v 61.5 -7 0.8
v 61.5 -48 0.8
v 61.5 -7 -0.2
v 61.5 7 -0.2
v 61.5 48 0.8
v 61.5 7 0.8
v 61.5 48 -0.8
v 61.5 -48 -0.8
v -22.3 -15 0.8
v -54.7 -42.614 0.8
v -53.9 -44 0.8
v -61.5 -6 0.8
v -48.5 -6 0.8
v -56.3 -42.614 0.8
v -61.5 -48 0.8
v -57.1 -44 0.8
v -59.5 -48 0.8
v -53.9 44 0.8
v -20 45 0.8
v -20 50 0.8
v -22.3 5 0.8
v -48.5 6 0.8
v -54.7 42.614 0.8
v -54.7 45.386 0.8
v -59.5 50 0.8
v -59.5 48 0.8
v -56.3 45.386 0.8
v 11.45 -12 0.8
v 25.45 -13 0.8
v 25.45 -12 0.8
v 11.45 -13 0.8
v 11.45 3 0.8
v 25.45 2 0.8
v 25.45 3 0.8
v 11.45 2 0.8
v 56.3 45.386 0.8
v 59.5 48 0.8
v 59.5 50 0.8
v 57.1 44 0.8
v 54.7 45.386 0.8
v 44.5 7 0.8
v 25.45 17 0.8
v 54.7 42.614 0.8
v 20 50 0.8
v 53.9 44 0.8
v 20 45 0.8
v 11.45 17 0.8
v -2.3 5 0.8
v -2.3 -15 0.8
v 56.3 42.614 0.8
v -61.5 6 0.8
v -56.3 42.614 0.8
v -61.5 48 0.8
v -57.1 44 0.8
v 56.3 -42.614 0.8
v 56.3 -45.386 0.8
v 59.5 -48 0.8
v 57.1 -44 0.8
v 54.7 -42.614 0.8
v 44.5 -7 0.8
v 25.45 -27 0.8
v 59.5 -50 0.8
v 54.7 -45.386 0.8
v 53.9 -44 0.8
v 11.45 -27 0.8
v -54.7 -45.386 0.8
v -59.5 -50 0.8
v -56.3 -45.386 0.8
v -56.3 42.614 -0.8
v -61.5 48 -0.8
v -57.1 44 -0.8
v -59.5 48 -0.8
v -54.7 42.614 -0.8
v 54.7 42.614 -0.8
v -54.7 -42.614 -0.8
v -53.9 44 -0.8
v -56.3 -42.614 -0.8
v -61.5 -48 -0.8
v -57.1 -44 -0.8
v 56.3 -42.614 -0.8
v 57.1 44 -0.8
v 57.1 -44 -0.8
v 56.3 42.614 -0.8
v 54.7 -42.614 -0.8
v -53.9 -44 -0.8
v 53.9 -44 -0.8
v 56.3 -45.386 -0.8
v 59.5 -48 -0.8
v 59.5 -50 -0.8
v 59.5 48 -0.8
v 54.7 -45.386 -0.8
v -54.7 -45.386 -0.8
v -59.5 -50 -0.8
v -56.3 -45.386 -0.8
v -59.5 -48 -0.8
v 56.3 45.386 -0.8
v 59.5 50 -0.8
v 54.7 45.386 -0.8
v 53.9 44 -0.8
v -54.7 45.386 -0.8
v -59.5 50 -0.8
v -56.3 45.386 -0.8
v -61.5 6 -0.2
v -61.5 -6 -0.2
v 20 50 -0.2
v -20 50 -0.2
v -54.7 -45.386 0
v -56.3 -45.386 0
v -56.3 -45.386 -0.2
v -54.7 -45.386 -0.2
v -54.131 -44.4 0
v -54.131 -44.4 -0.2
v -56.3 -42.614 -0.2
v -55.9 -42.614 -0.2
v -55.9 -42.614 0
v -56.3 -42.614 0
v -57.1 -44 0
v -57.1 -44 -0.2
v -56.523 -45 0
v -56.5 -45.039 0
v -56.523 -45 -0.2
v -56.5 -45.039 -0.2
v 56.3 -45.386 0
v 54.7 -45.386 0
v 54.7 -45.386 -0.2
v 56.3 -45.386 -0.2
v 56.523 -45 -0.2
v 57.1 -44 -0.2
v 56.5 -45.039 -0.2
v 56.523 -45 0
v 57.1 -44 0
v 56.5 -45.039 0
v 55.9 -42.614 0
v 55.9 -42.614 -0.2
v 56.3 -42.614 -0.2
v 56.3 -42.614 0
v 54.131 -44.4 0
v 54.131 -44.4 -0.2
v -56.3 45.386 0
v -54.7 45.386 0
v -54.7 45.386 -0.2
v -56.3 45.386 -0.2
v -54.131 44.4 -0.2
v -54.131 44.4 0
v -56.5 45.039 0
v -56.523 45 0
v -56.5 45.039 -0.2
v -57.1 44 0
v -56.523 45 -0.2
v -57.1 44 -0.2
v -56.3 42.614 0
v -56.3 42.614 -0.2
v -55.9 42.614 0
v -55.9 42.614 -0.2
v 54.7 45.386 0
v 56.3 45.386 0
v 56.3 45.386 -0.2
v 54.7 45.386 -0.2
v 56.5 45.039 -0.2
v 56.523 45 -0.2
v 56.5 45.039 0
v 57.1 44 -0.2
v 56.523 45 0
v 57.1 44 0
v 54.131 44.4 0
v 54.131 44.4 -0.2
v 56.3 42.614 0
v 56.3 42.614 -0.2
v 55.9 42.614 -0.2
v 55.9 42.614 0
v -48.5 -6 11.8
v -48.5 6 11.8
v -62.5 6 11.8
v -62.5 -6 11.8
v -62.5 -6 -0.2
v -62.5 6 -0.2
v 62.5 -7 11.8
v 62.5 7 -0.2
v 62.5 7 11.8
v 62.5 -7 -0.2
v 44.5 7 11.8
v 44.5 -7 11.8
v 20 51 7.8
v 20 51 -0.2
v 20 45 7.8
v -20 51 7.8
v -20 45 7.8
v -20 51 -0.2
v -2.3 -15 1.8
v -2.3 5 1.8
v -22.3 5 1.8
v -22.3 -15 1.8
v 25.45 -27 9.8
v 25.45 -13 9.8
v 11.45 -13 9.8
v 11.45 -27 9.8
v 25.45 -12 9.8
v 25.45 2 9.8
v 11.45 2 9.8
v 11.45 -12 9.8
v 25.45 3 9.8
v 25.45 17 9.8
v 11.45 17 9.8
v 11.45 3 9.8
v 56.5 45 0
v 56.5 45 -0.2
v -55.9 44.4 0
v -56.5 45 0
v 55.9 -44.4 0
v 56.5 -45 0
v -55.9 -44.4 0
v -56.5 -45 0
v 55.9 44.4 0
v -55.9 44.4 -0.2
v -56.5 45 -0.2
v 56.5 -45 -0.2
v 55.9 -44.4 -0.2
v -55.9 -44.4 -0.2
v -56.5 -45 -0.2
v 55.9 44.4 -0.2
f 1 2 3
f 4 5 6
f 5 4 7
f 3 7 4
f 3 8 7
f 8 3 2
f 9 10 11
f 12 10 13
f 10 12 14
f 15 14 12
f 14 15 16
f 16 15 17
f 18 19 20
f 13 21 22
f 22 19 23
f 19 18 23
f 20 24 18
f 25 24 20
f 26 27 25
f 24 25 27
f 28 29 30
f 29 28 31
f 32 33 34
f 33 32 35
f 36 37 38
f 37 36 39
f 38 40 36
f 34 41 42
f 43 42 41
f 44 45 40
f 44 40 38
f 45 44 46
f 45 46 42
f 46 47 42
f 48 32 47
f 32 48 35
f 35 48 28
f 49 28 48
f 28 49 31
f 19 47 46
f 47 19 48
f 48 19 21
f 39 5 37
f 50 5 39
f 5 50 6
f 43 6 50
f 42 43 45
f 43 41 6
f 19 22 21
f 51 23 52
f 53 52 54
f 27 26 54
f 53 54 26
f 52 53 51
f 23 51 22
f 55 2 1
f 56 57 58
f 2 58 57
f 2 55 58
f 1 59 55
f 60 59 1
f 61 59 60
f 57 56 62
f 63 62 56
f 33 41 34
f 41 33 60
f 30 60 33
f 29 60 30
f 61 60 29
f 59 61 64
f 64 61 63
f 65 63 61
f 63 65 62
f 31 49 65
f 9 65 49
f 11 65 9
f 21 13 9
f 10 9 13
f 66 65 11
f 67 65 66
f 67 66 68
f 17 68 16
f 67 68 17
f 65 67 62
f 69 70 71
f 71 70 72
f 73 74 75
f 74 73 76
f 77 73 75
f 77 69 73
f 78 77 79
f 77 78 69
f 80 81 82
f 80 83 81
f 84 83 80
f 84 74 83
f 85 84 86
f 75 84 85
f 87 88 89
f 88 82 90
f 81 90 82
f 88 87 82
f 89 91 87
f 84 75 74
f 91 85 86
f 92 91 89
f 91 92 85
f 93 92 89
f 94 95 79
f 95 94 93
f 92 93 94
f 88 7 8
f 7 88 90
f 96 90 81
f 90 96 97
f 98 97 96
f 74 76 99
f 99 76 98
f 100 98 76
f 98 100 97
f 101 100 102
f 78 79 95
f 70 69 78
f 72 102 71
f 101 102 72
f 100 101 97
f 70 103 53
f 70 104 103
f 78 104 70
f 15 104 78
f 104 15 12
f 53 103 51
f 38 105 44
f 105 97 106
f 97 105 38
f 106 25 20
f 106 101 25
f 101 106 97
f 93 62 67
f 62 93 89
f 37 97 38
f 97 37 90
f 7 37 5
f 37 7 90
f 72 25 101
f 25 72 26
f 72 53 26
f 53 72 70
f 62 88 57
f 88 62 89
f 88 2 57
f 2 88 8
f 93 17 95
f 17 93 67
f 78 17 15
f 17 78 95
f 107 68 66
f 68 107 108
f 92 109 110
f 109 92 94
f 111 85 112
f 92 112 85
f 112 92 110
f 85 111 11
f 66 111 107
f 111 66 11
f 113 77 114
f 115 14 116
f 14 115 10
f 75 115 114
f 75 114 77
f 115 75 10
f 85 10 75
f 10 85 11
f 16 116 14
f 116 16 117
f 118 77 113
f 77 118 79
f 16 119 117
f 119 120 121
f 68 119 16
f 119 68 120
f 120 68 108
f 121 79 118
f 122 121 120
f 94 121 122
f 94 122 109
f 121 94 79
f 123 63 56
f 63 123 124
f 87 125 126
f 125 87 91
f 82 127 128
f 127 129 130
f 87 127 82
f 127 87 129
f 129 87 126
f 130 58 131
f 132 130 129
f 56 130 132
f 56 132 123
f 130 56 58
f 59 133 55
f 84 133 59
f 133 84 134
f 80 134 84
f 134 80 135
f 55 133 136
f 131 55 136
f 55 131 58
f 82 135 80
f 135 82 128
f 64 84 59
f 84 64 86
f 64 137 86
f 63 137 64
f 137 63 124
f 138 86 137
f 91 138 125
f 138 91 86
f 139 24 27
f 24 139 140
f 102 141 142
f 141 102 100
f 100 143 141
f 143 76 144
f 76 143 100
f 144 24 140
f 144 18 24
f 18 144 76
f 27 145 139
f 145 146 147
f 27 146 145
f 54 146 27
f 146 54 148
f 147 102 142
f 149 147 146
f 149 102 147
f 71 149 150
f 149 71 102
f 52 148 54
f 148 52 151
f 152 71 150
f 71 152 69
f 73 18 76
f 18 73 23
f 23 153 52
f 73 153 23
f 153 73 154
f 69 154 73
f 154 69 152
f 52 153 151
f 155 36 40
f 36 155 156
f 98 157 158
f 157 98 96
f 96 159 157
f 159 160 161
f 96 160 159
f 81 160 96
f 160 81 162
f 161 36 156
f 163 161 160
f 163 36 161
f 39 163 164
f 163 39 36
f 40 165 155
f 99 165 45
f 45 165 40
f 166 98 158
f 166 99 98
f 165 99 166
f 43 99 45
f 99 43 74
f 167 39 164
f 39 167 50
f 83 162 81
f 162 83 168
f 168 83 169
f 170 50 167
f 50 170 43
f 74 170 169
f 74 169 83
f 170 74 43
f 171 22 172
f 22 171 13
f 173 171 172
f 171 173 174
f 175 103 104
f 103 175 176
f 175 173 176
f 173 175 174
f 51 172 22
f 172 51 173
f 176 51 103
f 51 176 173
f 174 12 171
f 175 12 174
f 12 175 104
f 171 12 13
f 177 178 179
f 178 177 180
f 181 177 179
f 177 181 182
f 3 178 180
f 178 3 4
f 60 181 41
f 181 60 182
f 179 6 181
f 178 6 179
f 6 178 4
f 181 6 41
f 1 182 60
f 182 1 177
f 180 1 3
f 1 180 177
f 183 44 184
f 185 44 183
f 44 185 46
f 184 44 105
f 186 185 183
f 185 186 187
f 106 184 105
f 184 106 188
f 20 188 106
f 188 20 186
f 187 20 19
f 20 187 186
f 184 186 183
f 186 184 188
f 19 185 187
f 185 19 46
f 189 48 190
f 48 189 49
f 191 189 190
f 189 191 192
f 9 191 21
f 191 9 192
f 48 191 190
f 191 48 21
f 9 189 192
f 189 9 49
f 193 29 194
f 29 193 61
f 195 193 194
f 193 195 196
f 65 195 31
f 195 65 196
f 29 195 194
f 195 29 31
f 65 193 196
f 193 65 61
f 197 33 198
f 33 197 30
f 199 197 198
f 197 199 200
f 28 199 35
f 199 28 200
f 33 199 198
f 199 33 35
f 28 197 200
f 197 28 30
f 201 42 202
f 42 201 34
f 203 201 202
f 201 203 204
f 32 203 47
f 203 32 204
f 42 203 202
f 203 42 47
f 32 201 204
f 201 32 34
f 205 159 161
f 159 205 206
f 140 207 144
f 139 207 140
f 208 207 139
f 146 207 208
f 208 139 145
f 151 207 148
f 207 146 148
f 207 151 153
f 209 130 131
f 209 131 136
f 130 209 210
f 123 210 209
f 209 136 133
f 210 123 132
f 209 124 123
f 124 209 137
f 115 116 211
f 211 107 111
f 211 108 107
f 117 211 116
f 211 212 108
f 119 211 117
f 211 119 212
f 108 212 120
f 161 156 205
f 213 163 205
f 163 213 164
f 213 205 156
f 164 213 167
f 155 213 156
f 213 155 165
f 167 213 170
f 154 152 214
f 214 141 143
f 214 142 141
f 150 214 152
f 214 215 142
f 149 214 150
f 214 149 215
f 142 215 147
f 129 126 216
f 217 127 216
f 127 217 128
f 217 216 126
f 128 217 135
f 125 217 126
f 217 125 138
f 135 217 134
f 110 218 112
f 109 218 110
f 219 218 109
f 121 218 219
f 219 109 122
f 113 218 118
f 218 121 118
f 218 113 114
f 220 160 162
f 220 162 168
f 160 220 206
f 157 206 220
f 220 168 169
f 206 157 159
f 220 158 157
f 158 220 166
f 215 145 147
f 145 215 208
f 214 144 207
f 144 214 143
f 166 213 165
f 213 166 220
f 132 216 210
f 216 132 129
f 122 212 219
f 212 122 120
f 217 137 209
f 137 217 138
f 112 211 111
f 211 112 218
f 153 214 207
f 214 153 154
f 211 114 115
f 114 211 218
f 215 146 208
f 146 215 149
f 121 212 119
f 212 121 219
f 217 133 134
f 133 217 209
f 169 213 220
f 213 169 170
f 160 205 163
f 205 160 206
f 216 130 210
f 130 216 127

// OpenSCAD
// Parameters
board_length = 123.0; //[61.5:246.0:0.5]
board_width = 100.0; //[50.0:200.0:0.5]
board_thickness = 1.6; //[0.8:3.2:0.1]
edge_chamfer = 1.0; //[0.5:2.0:0.1]
corner_cutout_depth = 2.0; //[0.5:4.0:0.1]
mount_hole_diameter = 3.2; //[2.0:5.0:0.1]
mount_hole_edge_offset_x = 6.0; //[3.0:12.0:0.5]
mount_hole_edge_offset_y = 6.0; //[3.0:12.0:0.5]
hole_clearance_height = 6.0; //[3.0:12.0:0.5]
connector_height = 12.0; //[6.0:24.0:0.5]
connector_wall_overlap = 1.0; //[0.5:2.0:0.1]
usb_conn_length = 14.0; //[7.0:28.0:0.5]
usb_conn_width = 12.0; //[6.0:24.0:0.5]
power_conn_length = 18.0; //[9.0:36.0:0.5]
power_conn_width = 14.0; //[7.0:28.0:0.5]
header_length = 40.0; //[20.0:80.0:0.5]
header_width = 6.0; //[3.0:12.0:0.5]
header_height = 8.0; //[4.0:16.0:0.5]
chip_height = 2.0; //[1.0:5.0:0.1]
mcu_length = 20.0; //[10.0:40.0:0.5]
mcu_width = 20.0; //[10.0:40.0:0.5]
driver_length = 10.0; //[5.0:20.0:0.5]
driver_width = 10.0; //[5.0:20.0:0.5]
heatsink_length = 14.0; //[7.0:28.0:0.5]
heatsink_width = 14.0; //[7.0:28.0:0.5]
heatsink_height = 10.0; //[5.0:20.0:0.5]
silkscreen_height = 0.2; //[0.1:0.6:0.05]
silkscreen_margin = 5.0; //[2.0:10.0:0.5]
overlap = 1.0; //[0.5:2.0:0.1]

// Base Shapes
module pcb_board() {
  color([0.0, 0.4, 0.2]) // Green PCB
  cube([board_length, board_width, board_thickness], center = true);
}

module corner_cutout() {
  cube([edge_chamfer * 2, edge_chamfer * 2, board_thickness + corner_cutout_depth], center = true);
}

module mount_hole_cyl() {
  cylinder(h = hole_clearance_height, r = mount_hole_diameter / 2, center = true);
}

module usb_connector_body() {
  color("DimGray")
  cube([usb_conn_length, usb_conn_width, connector_height], center = true);
}

module power_connector_body() {
  color("DimGray")
  cube([power_conn_length, power_conn_width, connector_height], center = true);
}

module header_body() {
  color("DimGray")
  cube([header_length, header_width, header_height], center = true);
}

module mcu_chip() {
  color("Black")
  cube([mcu_length, mcu_width, chip_height], center = true);
}

module driver_chip() {
  color("Black")
  cube([driver_length, driver_width, chip_height], center = true);
}

module heatsink_block() {
  color("Silver")
  cube([heatsink_length, heatsink_width, heatsink_height], center = true);
}

module silkscreen_border_x() {
  color("White")
  cube([board_length - 2 * silkscreen_margin, silkscreen_height * 6, silkscreen_height], center = true);
}

module silkscreen_border_y() {
  color("White")
  cube([silkscreen_height * 6, board_width - 2 * silkscreen_margin, silkscreen_height], center = true);
}

// Operations
module pcb_with_edge_chamfer_or_fillet() {
  difference() {
    pcb_board();
    translate([board_length / 2 - edge_chamfer, board_width / 2 - edge_chamfer, 0]) corner_cutout();
    translate([-board_length / 2 + edge_chamfer, board_width / 2 - edge_chamfer, 0]) corner_cutout();
    translate([board_length / 2 - edge_chamfer, -board_width / 2 + edge_chamfer, 0]) corner_cutout();
    translate([-board_length / 2 + edge_chamfer, -board_width / 2 + edge_chamfer, 0]) corner_cutout();
  }
}

module pcb_with_mounting_holes() {
  difference() {
    pcb_with_edge_chamfer_or_fillet();
    translate([-board_length / 2 + mount_hole_edge_offset_x, -board_width / 2 + mount_hole_edge_offset_y, 0]) mount_hole_cyl();
    translate([board_length / 2 - mount_hole_edge_offset_x, -board_width / 2 + mount_hole_edge_offset_y, 0]) mount_hole_cyl();
    translate([-board_length / 2 + mount_hole_edge_offset_x, board_width / 2 - mount_hole_edge_offset_y, 0]) mount_hole_cyl();
    translate([board_length / 2 - mount_hole_edge_offset_x, board_width / 2 - mount_hole_edge_offset_y, 0]) mount_hole_cyl();
  }
}

module connectors() {
  union() {
    translate([-board_length / 2 + usb_conn_length / 2 - overlap, 0, board_thickness / 2 + connector_height / 2 - connector_wall_overlap]) usb_connector_body();
    translate([board_length / 2 - power_conn_length / 2 + overlap, 0, board_thickness / 2 + connector_height / 2 - connector_wall_overlap]) power_connector_body();
    translate([0, board_width / 2 - header_width / 2 + overlap, board_thickness / 2 + header_height / 2 - connector_wall_overlap]) header_body();
  }
}

module chips() {
  union() {
    translate([-board_length * 0.10, -board_width * 0.05, board_thickness / 2 + chip_height / 2 - overlap]) mcu_chip();
    translate([board_length * 0.15, -board_width * 0.20, board_thickness / 2 + chip_height / 2 - overlap]) driver_chip();
    translate([board_length * 0.15, -board_width * 0.05, board_thickness / 2 + chip_height / 2 - overlap]) driver_chip();
    translate([board_length * 0.15, board_width * 0.10, board_thickness / 2 + chip_height / 2 - overlap]) driver_chip();
  }
}

module heatsinks() {
  union() {
    translate([board_length * 0.15, -board_width * 0.20, board_thickness / 2 + heatsink_height / 2 - overlap]) heatsink_block();
    translate([board_length * 0.15, -board_width * 0.05, board_thickness / 2 + heatsink_height / 2 - overlap]) heatsink_block();
    translate([board_length * 0.15, board_width * 0.10, board_thickness / 2 + heatsink_height / 2 - overlap]) heatsink_block();
  }
}

module silkscreen_markings() {
  union() {
    translate([0, board_width / 2 - silkscreen_margin, board_thickness / 2 + silkscreen_height / 2 - overlap]) silkscreen_border_x();
    translate([0, -board_width / 2 + silkscreen_margin, board_thickness / 2 + silkscreen_height / 2 - overlap]) silkscreen_border_x();
    translate([-board_length / 2 + silkscreen_margin, 0, board_thickness / 2 + silkscreen_height / 2 - overlap]) silkscreen_border_y();
    translate([board_length / 2 - silkscreen_margin, 0, board_thickness / 2 + silkscreen_height / 2 - overlap]) silkscreen_border_y();
  }
}

// Final Assembly
module pcb_assembly_union() {
  union() {
    pcb_with_mounting_holes();
    connectors();
    chips();
    heatsinks();
    silkscreen_markings();
  }
}

// Render the final PCB assembly
pcb_assembly_union();
